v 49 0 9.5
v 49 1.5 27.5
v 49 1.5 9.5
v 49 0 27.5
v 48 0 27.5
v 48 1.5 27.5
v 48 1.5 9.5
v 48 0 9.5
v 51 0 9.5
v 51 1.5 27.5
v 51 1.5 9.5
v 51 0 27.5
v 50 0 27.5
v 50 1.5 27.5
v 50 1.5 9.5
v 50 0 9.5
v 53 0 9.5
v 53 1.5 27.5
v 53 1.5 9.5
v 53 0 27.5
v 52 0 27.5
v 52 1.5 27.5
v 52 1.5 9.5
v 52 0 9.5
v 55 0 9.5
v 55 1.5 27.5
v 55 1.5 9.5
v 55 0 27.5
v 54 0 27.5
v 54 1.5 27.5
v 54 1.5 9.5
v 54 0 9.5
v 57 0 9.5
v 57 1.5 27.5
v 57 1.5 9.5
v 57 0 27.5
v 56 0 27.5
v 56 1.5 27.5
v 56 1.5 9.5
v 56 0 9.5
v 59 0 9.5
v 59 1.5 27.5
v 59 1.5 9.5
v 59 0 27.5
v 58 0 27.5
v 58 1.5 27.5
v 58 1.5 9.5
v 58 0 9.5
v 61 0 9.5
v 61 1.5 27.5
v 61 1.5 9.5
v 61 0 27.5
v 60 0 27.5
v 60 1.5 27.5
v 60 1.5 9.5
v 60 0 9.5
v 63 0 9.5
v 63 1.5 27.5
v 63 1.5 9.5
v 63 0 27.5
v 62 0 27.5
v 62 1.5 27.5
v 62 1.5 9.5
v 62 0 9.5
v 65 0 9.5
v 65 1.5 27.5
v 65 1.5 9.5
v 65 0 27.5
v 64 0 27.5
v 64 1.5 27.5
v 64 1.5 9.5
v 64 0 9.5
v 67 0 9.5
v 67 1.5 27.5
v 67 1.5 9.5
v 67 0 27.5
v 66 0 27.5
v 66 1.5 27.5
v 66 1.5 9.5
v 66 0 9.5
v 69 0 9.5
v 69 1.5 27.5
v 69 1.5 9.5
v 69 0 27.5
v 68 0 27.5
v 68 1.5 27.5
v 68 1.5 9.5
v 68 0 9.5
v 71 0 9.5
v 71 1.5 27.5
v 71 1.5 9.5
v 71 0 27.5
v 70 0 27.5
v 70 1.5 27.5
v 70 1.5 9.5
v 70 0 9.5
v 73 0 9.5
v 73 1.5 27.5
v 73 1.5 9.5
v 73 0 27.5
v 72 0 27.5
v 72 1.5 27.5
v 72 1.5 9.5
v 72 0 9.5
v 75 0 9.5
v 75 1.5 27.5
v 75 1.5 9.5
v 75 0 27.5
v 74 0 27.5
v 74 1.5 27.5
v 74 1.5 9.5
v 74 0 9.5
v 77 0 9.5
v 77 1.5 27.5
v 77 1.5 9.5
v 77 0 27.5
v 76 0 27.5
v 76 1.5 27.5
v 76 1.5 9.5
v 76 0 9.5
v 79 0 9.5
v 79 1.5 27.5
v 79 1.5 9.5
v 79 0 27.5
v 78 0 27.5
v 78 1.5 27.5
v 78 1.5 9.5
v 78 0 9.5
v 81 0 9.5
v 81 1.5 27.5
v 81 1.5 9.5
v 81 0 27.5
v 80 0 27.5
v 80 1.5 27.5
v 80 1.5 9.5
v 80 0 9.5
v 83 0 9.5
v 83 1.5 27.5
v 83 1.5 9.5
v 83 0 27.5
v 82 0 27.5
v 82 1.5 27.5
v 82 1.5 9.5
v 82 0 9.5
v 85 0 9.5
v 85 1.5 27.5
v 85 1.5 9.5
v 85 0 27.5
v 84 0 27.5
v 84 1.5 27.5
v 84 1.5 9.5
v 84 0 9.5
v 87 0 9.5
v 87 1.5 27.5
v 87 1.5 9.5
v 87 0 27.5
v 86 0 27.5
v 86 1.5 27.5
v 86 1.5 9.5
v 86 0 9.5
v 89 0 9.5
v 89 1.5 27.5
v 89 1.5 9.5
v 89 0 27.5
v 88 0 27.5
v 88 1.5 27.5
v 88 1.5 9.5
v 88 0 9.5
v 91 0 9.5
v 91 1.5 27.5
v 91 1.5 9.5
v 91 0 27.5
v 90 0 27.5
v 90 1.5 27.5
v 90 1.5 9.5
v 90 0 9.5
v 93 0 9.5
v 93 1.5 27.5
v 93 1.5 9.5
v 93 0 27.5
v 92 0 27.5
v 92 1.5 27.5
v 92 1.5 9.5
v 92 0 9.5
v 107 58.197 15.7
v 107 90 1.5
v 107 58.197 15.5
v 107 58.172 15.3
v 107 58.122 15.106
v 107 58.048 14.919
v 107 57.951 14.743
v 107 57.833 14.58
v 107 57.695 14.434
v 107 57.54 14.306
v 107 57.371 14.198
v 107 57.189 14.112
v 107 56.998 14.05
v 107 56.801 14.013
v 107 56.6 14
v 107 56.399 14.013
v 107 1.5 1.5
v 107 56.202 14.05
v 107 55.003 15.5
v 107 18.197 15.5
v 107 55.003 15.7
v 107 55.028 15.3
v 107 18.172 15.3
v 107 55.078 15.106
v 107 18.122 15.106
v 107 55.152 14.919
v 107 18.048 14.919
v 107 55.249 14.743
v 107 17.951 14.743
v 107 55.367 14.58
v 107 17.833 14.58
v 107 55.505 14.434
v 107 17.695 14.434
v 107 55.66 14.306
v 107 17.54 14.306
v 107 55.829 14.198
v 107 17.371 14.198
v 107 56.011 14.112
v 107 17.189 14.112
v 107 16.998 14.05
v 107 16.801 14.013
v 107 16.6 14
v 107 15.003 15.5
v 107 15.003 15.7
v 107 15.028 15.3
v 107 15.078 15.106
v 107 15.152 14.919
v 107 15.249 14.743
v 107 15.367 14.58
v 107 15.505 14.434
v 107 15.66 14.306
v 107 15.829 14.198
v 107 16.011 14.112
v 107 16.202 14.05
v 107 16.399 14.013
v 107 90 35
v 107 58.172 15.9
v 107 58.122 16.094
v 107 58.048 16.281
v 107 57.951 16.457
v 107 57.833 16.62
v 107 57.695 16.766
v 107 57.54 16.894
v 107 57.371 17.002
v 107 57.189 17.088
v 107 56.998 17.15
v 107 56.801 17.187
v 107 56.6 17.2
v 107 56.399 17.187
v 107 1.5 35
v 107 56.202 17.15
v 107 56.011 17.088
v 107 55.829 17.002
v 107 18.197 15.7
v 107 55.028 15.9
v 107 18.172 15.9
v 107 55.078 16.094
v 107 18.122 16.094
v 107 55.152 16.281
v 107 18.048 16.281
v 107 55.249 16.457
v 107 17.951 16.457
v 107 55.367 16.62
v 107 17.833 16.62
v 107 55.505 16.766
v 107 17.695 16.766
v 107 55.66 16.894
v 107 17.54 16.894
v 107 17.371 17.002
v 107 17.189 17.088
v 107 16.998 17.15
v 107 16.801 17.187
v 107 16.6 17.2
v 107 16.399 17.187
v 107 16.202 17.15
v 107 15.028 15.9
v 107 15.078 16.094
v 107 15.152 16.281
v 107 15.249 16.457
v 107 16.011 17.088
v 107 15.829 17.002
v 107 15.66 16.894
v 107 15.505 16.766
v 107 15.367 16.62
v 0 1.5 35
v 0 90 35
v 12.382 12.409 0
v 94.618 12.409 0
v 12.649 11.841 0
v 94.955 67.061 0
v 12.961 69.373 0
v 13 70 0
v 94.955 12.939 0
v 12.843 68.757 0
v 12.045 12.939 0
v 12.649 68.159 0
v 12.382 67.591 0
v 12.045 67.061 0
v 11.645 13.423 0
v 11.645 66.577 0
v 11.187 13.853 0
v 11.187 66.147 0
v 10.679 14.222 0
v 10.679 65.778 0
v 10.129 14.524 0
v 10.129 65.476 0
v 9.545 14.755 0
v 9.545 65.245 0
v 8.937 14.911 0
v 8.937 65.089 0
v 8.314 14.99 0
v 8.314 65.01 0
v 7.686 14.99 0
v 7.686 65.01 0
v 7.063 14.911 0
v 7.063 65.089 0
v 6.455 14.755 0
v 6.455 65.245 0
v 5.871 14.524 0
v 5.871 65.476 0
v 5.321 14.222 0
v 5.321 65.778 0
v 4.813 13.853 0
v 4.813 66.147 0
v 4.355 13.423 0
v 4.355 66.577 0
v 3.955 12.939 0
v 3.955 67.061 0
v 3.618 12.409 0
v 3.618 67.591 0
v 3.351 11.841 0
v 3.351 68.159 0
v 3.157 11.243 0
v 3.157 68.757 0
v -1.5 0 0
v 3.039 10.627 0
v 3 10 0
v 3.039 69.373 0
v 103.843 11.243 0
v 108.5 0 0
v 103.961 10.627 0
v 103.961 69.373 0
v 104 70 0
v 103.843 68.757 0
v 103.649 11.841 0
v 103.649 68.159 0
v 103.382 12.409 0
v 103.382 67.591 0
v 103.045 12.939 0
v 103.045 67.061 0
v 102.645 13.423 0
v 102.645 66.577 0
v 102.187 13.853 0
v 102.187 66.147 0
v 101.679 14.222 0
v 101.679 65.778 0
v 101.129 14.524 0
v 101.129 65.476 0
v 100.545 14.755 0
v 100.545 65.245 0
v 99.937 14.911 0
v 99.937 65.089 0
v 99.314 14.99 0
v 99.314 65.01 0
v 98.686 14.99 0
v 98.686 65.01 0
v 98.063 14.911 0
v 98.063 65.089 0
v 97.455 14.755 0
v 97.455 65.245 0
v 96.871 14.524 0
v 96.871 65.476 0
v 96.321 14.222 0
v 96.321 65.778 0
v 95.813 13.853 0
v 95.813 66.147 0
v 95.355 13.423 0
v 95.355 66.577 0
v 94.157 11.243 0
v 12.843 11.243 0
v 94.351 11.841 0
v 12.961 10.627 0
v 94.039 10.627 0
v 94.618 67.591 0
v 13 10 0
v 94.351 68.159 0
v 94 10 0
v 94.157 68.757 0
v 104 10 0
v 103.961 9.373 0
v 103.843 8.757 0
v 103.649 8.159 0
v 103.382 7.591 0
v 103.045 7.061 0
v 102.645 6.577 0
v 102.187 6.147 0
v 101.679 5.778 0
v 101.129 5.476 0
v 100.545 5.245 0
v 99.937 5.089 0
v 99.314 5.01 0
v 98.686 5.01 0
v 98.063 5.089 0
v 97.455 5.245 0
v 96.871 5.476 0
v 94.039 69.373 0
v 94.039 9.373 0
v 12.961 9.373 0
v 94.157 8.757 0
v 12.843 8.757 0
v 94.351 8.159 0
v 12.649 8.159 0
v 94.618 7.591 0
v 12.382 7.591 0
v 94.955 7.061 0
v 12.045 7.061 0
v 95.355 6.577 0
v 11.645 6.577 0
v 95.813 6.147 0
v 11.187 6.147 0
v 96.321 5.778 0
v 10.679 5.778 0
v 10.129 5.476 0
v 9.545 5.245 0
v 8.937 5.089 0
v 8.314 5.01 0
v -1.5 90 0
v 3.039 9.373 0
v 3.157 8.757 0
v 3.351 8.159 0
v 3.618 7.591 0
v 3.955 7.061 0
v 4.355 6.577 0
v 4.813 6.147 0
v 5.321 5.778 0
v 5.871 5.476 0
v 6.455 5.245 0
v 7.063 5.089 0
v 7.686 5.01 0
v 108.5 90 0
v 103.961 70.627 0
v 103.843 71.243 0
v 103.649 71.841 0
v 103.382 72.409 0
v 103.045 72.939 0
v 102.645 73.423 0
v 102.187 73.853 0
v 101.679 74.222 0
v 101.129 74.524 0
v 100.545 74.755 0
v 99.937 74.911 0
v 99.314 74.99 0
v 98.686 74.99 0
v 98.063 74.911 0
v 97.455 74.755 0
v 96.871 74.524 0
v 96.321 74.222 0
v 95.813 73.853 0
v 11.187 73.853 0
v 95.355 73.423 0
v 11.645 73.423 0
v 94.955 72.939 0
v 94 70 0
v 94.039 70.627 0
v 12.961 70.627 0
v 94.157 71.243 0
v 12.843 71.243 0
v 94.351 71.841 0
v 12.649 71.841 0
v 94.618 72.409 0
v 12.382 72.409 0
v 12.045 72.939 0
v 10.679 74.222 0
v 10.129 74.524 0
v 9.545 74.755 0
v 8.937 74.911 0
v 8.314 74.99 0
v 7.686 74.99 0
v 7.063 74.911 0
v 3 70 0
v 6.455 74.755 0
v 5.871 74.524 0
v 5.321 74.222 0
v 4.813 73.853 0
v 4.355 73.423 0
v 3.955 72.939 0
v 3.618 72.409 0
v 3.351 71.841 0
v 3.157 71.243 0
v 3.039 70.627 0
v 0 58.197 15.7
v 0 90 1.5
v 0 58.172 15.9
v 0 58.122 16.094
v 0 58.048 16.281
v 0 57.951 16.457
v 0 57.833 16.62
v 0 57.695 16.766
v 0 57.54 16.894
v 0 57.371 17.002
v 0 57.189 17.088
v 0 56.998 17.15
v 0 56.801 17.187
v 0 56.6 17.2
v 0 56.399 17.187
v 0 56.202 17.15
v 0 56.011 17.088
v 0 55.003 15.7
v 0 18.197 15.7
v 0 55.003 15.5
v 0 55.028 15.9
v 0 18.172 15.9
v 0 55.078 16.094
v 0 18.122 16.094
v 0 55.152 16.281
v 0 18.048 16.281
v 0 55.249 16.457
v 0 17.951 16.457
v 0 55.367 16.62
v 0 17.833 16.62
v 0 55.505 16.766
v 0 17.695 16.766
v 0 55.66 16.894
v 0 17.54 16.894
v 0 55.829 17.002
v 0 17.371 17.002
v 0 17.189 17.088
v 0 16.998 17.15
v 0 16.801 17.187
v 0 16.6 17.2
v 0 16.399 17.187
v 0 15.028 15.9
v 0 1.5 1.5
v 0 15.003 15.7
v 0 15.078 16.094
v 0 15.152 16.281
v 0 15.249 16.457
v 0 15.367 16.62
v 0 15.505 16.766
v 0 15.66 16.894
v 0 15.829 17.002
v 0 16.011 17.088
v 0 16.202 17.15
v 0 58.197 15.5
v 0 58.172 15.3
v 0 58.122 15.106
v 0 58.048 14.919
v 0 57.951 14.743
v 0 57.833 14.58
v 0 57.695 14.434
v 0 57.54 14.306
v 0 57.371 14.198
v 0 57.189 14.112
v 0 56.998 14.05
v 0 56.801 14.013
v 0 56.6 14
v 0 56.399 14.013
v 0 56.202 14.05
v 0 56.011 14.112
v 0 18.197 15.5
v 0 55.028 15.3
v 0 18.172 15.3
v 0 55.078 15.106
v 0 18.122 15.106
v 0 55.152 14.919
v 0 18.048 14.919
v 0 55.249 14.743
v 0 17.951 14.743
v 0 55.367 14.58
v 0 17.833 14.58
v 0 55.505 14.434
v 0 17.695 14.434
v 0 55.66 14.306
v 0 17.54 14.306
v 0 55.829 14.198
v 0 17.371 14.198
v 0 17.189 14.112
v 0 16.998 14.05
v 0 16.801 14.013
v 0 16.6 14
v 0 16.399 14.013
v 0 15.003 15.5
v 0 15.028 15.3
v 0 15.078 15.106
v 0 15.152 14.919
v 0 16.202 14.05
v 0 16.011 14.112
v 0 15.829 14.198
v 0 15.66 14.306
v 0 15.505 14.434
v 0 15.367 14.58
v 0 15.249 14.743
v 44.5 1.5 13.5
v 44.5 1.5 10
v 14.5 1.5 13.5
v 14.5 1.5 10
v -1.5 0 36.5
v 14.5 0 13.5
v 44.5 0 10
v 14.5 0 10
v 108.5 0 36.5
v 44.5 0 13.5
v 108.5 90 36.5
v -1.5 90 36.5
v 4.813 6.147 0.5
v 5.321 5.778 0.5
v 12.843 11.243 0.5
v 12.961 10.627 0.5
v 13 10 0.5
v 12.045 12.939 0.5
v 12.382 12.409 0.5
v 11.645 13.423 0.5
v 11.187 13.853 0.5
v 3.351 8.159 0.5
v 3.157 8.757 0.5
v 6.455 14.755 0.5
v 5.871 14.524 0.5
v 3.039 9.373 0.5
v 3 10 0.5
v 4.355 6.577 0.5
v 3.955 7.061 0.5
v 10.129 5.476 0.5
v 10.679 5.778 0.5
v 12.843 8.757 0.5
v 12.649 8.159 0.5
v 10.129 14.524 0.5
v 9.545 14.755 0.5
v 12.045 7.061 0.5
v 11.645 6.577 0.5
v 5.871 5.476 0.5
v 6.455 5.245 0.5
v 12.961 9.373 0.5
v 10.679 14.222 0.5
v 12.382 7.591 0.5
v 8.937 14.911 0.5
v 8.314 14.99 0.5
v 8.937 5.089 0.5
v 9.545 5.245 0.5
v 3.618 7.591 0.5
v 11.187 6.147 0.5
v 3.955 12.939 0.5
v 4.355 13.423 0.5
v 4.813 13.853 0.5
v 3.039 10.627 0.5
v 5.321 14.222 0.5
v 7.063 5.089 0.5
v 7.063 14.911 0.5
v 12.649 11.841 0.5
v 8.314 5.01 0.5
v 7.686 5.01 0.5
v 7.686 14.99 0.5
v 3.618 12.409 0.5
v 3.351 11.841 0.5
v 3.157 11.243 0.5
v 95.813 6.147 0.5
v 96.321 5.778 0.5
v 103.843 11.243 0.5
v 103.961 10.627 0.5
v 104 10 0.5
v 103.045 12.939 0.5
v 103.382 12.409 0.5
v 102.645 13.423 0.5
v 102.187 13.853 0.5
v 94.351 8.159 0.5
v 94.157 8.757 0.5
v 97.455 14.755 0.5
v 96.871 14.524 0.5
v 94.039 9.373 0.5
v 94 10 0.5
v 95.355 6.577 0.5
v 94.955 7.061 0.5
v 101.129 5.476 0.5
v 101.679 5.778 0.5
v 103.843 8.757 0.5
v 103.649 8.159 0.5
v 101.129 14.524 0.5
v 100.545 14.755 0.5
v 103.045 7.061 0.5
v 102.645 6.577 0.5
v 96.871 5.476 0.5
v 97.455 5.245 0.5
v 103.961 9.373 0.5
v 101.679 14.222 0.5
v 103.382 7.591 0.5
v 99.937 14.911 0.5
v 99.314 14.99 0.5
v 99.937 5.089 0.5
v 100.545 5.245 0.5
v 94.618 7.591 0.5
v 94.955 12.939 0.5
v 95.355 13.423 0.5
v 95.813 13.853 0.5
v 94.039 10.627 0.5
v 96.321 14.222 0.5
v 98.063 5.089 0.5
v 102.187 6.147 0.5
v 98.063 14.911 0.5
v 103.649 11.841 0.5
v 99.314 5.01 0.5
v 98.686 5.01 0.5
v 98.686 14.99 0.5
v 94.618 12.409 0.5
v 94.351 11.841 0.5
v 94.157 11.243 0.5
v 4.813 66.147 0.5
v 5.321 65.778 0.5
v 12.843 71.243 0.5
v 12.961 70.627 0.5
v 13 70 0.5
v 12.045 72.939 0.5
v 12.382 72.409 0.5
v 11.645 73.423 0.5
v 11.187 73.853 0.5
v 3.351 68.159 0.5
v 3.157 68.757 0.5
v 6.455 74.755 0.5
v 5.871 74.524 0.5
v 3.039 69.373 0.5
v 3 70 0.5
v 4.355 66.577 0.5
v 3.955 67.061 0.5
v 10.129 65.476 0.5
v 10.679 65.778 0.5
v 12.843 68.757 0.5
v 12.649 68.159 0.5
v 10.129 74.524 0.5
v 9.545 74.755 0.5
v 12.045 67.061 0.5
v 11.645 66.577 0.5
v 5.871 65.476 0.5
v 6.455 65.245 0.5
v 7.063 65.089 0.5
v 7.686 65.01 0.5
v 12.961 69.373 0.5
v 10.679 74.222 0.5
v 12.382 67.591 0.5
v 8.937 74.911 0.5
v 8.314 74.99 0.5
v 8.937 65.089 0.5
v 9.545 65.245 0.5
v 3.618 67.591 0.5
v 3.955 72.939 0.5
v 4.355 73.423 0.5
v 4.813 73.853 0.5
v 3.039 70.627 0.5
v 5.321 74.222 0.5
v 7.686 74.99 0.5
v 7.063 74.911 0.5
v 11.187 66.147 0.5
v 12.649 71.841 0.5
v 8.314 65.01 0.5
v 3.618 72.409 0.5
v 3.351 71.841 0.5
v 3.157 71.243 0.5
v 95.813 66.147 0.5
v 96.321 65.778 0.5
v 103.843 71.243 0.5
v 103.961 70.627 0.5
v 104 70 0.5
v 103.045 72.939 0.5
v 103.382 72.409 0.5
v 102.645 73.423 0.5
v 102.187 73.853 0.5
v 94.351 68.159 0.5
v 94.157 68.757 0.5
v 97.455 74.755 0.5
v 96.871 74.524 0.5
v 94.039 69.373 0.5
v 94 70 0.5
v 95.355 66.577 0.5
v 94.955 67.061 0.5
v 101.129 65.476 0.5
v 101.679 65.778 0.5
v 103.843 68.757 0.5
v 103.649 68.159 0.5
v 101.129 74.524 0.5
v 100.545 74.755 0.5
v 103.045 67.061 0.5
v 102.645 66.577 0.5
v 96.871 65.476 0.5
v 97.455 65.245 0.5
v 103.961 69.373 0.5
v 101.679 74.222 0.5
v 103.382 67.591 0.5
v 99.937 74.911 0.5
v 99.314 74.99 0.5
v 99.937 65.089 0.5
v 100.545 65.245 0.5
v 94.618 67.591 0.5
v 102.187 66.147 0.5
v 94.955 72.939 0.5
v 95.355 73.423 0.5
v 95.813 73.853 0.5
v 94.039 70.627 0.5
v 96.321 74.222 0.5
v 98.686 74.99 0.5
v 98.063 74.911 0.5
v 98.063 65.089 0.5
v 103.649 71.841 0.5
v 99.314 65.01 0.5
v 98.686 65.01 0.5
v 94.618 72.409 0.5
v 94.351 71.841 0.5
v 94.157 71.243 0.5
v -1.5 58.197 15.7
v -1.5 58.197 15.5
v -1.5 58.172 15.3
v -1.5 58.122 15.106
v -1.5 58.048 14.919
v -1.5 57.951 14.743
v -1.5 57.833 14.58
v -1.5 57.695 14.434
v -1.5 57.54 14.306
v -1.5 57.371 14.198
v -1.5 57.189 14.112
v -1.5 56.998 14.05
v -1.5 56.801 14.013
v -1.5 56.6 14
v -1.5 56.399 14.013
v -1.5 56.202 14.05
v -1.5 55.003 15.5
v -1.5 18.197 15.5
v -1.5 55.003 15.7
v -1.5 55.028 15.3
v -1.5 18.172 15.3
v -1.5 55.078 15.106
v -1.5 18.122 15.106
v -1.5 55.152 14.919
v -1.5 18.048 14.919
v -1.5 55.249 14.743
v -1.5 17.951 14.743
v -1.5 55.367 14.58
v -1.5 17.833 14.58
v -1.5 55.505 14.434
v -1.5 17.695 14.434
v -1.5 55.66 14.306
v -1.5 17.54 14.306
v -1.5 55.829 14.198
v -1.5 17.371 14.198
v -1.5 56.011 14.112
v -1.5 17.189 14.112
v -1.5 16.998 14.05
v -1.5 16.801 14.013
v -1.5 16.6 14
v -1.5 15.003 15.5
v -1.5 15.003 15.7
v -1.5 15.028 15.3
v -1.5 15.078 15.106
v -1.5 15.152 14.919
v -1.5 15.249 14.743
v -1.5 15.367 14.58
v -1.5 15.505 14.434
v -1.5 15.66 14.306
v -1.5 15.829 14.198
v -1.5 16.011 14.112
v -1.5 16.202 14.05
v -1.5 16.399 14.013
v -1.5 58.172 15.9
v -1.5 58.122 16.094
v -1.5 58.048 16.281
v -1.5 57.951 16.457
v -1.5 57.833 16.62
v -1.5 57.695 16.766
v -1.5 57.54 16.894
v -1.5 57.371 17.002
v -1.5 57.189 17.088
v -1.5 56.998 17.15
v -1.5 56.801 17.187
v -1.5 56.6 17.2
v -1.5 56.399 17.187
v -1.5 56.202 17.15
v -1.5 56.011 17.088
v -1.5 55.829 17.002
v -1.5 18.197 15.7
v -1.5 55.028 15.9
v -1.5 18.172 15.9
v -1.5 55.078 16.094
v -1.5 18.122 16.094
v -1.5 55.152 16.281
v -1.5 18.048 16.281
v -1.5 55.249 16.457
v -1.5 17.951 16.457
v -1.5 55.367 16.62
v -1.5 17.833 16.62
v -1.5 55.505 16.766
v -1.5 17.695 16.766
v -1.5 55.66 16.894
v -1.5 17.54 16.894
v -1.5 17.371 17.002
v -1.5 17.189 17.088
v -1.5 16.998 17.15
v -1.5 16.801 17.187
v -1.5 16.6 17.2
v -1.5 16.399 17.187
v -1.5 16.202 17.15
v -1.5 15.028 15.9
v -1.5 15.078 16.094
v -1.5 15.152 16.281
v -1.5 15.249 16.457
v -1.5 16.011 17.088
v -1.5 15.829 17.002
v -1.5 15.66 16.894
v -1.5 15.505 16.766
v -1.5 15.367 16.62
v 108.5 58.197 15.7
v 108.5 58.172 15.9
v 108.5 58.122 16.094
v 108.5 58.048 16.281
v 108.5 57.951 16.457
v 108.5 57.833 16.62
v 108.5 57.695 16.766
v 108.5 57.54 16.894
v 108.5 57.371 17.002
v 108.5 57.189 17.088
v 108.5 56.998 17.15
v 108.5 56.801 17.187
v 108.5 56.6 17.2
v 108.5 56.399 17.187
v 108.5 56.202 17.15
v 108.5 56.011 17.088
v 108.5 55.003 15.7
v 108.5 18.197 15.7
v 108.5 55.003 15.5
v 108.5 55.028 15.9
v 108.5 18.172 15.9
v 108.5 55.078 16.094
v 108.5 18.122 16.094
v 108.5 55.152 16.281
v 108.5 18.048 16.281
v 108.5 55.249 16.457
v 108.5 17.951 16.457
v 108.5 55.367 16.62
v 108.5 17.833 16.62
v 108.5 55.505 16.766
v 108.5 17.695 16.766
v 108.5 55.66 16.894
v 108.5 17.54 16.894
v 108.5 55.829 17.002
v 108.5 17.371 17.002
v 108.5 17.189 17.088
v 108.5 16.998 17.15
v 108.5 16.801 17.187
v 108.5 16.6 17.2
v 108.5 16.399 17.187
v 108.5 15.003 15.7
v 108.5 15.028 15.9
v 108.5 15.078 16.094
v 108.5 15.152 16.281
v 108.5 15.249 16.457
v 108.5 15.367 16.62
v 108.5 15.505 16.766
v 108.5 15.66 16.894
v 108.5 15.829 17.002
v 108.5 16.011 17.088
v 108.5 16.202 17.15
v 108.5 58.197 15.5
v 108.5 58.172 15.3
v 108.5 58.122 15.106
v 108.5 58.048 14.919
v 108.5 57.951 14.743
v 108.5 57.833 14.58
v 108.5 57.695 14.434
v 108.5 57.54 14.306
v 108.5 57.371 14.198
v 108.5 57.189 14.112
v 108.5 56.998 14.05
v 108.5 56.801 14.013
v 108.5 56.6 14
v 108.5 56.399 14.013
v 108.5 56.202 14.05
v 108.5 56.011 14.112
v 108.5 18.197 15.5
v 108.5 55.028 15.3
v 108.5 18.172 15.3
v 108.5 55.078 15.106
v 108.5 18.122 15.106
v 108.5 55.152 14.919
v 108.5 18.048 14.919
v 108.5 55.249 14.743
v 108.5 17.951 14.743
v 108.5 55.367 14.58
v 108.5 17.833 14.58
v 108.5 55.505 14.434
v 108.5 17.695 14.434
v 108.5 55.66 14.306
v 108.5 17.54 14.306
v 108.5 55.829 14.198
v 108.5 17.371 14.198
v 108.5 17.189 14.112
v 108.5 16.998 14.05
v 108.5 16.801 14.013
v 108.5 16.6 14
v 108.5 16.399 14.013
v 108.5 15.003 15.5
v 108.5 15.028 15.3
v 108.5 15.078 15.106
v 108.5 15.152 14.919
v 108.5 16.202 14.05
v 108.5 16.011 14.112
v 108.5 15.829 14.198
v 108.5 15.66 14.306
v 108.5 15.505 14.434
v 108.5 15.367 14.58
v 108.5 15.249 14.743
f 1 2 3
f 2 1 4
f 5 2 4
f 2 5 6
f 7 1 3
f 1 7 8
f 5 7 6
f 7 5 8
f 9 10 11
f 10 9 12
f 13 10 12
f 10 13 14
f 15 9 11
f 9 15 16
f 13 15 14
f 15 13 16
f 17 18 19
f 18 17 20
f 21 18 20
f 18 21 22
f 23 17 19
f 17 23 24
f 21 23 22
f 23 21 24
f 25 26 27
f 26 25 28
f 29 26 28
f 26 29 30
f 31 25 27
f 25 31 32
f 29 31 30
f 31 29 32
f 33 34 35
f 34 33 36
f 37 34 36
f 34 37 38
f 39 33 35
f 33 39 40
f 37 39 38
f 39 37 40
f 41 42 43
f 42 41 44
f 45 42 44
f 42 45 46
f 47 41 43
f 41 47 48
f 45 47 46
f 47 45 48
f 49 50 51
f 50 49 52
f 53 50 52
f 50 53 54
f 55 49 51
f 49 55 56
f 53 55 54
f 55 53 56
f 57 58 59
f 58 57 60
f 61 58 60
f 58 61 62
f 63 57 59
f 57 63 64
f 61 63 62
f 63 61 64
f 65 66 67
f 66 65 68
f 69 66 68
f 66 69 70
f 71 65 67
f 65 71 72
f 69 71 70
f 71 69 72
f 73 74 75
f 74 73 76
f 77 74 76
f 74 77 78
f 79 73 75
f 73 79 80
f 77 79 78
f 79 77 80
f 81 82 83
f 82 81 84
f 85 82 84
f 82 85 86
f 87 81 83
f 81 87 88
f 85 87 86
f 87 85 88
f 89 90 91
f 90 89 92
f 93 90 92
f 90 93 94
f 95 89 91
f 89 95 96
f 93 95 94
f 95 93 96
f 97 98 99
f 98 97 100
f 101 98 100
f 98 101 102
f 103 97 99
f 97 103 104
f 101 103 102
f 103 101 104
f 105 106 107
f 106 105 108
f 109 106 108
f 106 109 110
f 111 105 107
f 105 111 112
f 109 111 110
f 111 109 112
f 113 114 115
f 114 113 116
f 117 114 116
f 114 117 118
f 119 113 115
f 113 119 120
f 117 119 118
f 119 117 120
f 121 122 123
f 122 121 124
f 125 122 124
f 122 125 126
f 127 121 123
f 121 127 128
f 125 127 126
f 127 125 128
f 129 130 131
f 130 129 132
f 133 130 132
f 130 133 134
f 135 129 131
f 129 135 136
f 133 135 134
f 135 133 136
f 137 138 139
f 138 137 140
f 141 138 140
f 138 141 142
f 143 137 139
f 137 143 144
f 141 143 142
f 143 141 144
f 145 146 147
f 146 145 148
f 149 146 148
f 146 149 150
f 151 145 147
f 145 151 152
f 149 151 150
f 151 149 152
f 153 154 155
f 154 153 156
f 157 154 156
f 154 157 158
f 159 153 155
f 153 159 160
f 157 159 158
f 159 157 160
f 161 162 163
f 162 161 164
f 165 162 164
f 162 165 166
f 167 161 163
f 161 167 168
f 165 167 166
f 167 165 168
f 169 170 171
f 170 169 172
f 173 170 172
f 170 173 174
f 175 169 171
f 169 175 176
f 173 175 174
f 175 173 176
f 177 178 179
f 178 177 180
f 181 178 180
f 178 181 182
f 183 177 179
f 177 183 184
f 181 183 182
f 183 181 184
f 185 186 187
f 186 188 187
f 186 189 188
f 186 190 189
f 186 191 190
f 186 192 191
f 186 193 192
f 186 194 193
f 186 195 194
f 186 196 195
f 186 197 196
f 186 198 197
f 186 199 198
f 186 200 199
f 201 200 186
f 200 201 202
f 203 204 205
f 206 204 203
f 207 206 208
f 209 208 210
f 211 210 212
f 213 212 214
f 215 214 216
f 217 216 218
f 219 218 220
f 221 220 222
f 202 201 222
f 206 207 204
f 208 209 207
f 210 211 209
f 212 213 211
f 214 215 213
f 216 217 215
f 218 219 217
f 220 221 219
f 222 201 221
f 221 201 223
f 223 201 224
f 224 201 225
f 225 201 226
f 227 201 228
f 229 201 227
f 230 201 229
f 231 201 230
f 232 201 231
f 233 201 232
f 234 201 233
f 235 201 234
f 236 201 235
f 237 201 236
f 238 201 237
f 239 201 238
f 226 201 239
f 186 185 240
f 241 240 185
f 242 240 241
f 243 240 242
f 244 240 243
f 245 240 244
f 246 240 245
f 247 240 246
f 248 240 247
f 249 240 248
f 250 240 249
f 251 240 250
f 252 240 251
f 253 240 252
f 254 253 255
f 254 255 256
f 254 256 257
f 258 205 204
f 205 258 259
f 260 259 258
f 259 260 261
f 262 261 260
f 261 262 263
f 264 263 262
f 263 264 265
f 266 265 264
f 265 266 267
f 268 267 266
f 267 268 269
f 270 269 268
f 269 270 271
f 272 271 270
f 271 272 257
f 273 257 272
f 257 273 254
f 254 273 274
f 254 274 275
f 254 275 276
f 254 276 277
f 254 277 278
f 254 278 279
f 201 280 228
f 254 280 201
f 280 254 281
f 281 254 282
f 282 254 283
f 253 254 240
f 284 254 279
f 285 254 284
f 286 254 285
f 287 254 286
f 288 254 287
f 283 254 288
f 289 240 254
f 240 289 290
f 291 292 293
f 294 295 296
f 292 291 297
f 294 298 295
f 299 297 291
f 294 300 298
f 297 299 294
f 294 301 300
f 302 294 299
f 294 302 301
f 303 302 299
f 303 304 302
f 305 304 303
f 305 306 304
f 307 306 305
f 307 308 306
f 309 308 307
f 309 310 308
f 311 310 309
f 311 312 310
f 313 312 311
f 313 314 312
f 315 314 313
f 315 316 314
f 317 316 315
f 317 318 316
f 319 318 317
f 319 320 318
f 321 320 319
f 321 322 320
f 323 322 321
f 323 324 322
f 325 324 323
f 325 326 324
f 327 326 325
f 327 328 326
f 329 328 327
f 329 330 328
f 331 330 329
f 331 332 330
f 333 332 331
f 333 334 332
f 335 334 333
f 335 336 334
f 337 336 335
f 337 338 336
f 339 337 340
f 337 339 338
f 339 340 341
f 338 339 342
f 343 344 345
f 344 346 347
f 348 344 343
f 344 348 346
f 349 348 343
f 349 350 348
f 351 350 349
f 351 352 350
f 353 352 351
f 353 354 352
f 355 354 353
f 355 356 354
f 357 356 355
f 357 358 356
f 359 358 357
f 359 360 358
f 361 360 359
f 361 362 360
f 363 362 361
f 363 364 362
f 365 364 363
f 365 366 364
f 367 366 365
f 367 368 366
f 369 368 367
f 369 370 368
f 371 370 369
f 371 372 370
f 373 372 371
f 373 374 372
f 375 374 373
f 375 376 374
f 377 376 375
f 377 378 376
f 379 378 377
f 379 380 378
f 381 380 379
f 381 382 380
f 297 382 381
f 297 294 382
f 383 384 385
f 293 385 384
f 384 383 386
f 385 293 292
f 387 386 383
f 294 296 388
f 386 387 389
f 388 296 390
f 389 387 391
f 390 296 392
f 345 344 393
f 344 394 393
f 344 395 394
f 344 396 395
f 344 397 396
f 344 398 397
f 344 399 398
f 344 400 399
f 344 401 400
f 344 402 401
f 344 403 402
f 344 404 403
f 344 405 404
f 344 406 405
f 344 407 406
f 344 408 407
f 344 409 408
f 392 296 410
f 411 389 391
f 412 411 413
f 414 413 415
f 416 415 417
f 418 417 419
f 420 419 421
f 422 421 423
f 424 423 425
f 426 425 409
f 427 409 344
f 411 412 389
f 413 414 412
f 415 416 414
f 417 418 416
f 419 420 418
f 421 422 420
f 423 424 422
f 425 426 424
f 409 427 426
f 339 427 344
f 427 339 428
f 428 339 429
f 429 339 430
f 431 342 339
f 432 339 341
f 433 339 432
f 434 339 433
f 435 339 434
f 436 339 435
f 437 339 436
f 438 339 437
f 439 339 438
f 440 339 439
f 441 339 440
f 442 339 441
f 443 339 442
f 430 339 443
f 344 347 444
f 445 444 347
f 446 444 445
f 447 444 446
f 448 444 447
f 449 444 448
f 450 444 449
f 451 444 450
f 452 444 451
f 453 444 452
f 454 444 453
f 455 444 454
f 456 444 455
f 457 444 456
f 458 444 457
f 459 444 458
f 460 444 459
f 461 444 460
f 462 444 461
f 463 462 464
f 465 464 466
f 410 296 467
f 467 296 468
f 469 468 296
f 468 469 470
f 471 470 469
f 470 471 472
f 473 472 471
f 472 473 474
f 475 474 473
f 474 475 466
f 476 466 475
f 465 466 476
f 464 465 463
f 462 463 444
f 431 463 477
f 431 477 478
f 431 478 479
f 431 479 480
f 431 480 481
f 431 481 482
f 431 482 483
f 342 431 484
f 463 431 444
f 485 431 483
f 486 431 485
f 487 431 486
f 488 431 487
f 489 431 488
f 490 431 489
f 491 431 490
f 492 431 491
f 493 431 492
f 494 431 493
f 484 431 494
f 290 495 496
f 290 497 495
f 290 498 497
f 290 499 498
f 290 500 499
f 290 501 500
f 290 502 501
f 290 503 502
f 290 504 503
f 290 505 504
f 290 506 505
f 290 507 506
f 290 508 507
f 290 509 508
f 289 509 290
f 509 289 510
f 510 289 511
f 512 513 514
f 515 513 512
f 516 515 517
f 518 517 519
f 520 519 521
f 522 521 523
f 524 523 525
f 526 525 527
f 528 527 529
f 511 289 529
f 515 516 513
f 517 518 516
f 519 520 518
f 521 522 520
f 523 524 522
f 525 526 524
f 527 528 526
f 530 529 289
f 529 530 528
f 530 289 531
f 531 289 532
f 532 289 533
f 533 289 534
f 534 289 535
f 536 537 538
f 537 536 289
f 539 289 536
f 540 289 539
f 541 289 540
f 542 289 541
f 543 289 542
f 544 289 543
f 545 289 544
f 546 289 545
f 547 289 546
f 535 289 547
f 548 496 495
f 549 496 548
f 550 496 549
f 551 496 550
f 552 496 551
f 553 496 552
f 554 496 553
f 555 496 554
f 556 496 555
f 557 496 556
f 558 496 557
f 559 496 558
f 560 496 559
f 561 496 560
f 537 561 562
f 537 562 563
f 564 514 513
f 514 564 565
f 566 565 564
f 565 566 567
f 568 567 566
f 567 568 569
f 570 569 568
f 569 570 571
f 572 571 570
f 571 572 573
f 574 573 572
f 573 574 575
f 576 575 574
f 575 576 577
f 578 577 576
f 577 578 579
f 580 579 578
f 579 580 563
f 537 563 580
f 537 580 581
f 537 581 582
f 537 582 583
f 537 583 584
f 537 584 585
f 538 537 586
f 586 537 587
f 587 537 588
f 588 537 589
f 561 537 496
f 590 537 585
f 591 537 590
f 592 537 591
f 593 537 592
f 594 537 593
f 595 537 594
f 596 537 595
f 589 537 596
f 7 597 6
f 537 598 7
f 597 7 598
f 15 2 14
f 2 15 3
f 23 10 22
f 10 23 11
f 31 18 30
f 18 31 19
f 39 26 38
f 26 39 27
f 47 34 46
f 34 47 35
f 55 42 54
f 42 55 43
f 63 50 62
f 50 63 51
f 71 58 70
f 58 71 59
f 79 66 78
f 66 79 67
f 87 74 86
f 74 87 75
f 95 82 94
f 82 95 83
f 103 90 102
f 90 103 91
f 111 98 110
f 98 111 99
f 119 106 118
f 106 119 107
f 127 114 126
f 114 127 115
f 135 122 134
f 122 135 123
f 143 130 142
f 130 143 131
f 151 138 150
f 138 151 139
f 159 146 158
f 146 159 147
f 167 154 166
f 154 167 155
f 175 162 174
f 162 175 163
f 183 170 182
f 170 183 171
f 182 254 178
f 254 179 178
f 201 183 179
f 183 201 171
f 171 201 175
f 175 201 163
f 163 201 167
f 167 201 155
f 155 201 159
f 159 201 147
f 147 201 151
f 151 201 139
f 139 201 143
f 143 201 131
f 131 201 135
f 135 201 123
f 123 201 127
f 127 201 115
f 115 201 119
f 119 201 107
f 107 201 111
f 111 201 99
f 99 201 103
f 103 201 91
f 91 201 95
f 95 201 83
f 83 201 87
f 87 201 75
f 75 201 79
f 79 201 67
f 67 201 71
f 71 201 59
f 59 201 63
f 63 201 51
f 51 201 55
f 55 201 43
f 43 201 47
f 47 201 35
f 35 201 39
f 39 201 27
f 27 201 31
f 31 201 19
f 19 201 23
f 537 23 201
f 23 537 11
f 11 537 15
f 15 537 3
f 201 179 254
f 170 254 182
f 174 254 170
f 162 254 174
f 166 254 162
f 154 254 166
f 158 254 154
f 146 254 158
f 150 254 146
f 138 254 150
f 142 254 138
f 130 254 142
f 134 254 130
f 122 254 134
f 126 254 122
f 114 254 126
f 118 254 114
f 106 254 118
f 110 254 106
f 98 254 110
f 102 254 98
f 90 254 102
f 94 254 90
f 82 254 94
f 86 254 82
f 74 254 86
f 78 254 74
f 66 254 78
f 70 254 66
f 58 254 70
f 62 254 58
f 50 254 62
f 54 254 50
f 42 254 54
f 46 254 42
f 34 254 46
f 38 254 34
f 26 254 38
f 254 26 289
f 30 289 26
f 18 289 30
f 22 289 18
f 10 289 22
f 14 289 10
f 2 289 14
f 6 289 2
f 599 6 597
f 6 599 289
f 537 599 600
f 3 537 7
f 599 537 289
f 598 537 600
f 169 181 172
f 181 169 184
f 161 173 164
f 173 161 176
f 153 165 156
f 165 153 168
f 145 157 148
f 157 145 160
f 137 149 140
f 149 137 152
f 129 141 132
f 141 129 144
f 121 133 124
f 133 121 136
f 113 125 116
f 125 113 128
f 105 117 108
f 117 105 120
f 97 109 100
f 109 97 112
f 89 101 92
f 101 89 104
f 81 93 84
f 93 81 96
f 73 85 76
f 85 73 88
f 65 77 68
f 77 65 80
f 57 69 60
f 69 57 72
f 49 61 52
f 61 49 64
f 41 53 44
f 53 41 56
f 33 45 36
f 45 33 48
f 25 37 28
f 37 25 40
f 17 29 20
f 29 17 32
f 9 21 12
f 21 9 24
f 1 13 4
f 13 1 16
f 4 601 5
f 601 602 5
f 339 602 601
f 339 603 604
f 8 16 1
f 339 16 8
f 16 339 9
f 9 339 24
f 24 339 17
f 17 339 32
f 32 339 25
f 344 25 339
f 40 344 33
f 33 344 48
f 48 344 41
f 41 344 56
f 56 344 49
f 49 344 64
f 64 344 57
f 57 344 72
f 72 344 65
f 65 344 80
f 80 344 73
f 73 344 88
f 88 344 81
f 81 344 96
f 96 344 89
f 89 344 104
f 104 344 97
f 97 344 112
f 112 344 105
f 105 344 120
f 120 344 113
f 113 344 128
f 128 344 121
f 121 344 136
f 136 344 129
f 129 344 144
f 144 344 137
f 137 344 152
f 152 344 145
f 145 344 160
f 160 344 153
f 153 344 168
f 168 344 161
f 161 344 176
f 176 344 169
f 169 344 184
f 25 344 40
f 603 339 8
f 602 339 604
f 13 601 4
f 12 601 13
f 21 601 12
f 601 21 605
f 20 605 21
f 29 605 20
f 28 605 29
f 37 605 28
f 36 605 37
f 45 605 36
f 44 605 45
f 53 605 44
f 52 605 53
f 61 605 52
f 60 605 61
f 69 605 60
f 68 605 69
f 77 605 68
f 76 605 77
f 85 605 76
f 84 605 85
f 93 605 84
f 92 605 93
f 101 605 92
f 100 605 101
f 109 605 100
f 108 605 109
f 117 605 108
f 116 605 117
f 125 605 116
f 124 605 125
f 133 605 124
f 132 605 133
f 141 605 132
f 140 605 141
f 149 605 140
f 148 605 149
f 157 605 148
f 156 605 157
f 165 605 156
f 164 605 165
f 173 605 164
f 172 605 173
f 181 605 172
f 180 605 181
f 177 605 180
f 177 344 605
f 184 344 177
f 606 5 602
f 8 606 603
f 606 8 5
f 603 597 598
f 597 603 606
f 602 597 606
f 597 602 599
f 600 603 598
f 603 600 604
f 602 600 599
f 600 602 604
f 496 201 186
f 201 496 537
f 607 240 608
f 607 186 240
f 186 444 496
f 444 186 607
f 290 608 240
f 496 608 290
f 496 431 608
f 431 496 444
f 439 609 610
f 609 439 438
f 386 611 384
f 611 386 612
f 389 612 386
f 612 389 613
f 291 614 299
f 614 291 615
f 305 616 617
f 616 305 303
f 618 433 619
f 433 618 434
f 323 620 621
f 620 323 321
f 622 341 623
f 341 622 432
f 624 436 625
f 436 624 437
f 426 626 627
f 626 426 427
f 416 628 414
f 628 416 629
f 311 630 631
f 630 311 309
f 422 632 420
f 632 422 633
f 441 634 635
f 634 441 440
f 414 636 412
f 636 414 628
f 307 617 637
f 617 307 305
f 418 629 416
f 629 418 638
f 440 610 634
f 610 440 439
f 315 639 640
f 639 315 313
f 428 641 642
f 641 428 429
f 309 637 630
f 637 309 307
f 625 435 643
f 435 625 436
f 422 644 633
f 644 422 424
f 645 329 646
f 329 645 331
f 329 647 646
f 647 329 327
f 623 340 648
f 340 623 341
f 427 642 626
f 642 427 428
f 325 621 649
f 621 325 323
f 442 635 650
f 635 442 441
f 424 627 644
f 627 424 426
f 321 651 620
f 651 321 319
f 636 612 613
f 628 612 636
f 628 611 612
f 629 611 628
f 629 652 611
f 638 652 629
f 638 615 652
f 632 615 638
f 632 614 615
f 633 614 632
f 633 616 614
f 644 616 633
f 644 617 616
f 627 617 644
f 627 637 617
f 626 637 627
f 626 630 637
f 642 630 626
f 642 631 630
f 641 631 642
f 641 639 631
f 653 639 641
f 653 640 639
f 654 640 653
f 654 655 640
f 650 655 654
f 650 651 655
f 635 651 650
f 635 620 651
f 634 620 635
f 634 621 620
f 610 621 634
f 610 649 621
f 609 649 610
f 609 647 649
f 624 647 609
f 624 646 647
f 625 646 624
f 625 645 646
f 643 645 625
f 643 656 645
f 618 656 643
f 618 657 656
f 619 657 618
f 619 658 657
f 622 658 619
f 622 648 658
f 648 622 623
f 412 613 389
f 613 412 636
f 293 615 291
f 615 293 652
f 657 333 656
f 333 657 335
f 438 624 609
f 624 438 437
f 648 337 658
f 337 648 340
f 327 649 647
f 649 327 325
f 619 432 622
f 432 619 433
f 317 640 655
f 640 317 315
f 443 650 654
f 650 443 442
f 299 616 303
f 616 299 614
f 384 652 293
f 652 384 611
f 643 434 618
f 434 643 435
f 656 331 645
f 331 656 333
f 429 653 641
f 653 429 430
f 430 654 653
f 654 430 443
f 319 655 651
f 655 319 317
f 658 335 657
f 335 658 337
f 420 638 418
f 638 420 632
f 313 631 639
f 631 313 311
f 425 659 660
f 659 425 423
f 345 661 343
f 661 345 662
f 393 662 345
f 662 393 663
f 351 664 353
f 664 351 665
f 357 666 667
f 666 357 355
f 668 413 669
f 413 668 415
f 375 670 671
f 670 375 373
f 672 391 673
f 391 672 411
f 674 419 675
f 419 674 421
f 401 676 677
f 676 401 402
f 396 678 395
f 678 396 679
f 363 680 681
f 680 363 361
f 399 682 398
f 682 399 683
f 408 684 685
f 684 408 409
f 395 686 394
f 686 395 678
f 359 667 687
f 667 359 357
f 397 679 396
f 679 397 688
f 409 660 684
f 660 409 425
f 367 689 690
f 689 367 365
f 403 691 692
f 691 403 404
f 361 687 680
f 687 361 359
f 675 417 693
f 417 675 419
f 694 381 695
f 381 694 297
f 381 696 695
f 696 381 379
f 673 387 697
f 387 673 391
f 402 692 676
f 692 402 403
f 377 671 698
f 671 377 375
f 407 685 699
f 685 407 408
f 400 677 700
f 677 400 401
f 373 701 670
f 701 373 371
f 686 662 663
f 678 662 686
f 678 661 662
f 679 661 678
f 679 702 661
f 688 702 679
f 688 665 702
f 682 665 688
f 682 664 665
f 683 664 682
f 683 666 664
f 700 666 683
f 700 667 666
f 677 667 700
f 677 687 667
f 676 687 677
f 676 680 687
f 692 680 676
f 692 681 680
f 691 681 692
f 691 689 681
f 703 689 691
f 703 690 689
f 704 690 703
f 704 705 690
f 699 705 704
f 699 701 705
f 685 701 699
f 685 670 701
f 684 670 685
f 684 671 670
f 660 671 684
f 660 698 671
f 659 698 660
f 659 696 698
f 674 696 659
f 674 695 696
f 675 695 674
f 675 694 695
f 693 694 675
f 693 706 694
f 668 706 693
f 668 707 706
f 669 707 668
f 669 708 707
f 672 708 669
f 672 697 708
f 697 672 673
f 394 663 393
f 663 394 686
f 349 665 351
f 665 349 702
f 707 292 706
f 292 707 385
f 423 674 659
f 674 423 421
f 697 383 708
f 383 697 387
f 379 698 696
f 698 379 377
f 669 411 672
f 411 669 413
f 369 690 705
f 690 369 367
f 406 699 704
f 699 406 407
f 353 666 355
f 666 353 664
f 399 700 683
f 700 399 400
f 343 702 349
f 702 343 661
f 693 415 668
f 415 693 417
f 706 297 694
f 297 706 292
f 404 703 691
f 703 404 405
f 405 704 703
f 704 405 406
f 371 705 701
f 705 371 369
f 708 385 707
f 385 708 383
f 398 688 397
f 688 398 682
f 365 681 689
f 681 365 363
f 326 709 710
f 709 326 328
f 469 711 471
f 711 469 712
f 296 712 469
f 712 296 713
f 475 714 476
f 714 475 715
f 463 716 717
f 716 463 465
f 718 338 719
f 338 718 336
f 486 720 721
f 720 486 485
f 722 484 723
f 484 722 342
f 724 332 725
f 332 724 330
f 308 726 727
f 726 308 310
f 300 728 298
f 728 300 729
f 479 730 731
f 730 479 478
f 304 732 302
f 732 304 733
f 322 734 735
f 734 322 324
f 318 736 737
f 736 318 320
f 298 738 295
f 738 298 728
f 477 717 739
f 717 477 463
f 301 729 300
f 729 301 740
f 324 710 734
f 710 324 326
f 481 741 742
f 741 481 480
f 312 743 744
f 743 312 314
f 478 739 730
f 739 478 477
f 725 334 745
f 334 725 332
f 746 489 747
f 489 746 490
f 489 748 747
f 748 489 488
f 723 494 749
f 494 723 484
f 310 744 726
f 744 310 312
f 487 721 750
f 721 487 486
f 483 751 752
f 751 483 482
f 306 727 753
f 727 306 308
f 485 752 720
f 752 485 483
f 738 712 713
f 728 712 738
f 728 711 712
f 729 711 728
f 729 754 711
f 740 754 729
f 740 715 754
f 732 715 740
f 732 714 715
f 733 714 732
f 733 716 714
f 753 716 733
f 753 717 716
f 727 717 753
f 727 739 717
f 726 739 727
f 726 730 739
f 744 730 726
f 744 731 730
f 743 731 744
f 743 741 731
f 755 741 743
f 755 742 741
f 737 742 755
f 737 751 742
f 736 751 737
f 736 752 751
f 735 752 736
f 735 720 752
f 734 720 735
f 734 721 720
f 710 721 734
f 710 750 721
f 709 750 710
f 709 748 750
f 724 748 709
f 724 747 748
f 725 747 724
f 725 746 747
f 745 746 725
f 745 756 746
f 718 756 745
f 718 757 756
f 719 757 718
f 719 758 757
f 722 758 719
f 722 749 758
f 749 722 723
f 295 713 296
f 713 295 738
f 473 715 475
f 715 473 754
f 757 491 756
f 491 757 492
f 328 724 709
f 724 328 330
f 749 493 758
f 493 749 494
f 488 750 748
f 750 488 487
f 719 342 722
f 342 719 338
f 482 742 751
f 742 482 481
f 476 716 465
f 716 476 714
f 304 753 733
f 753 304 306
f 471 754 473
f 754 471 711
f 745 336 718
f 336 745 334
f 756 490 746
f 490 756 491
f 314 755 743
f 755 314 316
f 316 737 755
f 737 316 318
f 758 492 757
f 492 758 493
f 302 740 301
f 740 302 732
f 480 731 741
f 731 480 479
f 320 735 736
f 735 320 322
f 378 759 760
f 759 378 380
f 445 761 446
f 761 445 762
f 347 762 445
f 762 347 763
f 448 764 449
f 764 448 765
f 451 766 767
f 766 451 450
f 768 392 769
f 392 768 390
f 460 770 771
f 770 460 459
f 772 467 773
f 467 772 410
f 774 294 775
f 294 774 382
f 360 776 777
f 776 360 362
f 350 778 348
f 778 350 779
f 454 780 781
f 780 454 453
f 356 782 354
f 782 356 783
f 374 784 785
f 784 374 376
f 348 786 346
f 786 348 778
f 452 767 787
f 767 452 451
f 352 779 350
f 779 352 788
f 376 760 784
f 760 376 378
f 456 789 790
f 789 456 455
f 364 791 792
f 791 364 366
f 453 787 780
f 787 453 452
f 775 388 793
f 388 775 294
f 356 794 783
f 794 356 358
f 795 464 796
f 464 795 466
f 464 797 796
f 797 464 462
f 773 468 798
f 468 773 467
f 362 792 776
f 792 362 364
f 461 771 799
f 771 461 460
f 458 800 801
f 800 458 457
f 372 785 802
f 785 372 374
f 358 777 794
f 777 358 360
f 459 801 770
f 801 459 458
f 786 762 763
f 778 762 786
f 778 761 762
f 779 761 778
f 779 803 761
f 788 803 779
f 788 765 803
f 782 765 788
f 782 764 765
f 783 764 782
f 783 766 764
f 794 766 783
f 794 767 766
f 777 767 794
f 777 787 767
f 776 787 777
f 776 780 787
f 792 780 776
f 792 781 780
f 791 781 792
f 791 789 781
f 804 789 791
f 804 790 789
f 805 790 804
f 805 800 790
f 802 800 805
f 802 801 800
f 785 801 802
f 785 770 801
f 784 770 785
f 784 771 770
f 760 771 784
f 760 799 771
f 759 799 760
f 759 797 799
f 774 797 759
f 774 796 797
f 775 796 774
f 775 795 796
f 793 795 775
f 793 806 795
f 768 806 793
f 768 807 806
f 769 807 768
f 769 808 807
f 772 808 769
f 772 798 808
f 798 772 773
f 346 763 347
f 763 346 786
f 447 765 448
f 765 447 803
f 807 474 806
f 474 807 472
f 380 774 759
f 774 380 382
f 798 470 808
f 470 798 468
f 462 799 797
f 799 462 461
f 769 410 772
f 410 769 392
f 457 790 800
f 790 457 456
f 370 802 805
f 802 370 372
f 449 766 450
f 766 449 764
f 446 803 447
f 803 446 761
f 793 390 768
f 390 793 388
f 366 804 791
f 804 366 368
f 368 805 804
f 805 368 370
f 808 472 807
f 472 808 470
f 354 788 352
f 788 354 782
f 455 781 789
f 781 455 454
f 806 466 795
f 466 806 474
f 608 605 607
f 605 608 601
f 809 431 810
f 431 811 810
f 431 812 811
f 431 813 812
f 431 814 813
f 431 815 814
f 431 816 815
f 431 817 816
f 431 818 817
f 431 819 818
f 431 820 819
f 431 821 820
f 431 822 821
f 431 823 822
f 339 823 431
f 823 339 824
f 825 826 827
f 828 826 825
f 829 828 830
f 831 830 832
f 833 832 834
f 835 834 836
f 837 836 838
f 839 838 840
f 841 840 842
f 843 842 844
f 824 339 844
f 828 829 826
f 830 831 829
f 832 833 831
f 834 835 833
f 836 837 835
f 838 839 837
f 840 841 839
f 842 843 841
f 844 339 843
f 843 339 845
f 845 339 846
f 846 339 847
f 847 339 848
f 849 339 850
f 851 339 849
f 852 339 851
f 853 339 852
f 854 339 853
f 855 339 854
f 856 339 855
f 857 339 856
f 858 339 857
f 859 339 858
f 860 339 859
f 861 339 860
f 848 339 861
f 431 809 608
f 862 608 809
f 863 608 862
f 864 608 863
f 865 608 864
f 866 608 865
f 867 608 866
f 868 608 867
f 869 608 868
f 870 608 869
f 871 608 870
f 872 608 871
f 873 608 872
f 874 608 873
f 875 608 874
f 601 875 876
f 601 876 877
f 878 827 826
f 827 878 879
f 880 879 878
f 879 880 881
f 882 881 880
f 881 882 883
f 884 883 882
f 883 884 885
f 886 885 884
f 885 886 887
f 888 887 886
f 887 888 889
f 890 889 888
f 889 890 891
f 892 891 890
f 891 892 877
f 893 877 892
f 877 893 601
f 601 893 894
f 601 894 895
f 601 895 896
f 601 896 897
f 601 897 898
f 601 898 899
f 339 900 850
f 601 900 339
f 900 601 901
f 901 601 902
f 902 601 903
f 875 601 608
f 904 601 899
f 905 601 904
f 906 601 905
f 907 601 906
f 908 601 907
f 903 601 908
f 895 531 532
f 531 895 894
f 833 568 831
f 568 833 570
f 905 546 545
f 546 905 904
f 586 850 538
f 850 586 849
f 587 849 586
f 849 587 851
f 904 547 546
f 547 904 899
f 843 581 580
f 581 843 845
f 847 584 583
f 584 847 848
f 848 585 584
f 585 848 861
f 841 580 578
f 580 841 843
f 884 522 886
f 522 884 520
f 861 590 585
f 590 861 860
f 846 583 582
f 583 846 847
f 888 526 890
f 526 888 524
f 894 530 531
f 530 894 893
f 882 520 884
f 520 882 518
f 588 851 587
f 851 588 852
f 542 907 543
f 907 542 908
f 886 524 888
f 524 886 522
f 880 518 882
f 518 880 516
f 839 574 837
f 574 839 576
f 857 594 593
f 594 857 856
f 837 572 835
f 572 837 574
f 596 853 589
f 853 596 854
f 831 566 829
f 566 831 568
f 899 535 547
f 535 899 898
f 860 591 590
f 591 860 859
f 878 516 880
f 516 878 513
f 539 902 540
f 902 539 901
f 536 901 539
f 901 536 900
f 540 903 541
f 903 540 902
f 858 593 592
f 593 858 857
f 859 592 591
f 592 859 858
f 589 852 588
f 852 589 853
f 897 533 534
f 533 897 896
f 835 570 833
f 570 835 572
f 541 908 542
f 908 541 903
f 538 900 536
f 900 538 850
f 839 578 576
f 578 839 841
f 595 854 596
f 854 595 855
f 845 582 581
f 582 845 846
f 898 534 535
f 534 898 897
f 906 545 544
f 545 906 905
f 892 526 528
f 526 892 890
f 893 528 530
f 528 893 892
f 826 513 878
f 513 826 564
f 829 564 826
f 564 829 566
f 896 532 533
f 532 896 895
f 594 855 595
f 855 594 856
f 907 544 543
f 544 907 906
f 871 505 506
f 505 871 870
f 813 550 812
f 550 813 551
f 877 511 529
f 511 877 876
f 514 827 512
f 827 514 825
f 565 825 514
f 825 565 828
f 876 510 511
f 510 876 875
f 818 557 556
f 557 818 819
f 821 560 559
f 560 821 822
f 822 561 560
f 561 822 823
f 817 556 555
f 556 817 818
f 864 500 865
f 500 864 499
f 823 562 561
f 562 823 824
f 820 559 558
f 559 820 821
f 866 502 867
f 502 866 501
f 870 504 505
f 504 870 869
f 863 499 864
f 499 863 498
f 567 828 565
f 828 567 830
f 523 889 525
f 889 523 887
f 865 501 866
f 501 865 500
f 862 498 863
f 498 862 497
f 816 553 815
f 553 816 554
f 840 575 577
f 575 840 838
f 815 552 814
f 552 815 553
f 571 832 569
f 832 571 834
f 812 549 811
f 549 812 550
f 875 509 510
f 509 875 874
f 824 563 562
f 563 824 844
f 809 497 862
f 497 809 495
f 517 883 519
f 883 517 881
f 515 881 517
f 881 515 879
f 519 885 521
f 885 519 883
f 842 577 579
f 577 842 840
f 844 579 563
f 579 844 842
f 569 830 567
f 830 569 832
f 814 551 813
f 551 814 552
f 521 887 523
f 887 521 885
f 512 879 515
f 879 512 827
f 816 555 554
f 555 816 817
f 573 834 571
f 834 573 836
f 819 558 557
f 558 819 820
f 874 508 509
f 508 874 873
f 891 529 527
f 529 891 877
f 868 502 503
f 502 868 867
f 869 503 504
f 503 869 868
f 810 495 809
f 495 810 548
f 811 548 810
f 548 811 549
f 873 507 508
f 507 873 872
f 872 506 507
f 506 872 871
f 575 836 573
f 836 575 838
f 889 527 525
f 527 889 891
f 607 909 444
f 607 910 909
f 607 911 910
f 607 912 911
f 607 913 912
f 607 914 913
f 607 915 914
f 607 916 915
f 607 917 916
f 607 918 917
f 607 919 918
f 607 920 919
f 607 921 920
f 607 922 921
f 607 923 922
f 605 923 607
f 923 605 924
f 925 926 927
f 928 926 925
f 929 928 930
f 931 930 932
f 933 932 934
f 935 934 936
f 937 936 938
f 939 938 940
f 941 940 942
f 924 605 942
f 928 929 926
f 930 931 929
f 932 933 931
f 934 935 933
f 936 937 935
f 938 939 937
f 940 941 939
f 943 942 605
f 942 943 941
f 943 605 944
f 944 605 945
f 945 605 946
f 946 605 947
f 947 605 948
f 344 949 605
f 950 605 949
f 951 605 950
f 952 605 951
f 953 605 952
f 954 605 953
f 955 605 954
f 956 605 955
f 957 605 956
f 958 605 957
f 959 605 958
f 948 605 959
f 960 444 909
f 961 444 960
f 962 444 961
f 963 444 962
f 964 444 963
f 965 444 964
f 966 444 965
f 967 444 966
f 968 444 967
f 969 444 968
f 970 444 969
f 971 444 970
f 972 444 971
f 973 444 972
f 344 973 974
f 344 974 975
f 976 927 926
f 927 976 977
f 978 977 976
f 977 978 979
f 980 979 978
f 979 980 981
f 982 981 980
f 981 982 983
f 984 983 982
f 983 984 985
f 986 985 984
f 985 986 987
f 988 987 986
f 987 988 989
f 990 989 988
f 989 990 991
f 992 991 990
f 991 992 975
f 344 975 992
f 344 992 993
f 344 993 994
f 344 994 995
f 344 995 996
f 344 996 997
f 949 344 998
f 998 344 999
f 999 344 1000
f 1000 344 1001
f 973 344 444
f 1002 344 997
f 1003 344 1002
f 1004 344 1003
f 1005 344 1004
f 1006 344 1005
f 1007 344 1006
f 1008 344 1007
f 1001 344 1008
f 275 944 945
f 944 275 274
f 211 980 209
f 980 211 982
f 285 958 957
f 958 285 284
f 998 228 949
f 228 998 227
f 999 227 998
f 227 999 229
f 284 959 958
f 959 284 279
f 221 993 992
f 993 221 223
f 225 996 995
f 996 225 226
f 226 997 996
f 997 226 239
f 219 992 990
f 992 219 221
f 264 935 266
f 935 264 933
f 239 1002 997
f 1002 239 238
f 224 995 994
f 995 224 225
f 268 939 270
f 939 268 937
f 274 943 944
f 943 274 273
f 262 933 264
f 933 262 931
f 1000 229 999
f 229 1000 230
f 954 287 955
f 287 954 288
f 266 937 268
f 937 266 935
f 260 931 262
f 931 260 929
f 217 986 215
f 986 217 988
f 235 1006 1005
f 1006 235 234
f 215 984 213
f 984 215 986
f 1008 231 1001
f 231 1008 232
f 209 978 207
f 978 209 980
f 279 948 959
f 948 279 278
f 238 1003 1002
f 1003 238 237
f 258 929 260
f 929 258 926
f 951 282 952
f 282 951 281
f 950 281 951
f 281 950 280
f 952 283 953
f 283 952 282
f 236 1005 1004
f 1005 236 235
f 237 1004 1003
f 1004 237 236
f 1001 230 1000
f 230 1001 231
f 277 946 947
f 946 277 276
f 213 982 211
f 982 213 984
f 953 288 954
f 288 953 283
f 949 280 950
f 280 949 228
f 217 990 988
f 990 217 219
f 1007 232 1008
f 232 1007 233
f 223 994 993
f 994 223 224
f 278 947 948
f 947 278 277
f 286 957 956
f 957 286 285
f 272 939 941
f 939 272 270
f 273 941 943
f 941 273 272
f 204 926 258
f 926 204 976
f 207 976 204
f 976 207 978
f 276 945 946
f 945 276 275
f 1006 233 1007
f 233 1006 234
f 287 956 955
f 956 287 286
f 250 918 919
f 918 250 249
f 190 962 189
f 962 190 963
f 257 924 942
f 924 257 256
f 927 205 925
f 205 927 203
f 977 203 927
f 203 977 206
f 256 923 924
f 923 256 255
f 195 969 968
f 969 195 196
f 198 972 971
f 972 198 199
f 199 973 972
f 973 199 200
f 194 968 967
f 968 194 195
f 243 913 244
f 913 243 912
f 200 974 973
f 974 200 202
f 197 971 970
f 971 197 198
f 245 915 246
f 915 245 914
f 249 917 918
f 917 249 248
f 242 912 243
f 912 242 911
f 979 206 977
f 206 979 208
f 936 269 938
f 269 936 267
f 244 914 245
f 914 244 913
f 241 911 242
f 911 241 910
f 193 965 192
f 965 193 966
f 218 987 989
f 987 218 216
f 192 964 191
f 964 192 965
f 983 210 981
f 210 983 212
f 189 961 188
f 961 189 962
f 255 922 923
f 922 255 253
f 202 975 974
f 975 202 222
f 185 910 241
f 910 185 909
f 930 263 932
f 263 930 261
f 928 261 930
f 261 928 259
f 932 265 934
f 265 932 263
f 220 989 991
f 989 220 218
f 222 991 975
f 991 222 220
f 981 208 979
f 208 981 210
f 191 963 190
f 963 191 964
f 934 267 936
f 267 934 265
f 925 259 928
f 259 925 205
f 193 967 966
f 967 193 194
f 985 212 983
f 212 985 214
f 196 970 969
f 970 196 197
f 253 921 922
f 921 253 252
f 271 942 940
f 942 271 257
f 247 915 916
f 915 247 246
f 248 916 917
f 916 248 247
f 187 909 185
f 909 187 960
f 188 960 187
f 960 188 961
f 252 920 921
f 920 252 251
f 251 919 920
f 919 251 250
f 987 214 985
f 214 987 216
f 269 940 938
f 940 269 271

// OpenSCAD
$fa = 1;
$fs = 0.5;
$fn = 50;

////////////////////////////////
// All measurements are in mm //
////////////////////////////////

tw = 1.5; // thickness of any walls
total_width = 107;


difference() {
  // Faceplate
 cube([total_width, tw, 35]);

  // FreHD
  translate([14 + tw, -1, 8 + tw]) {
    // sd card hole
    translate([-1,0,0.5]) cube([30,10,3.5]);
  }
  for (xpos=[36:2:80]) { // grill to see leds
    translate([- 5 + (total_width/2) - 36.5 + xpos, -1, 9.5])
      cube([1,2*tw,18]);
  }
}

// Top
translate([0, 0, 35]) cube([total_width, 90, tw]);

// Bottom
difference() {
  cube([total_width, 90, tw]);
  translate([8,10,-1]) cylinder(h=tw,r=5);
  translate([99,10,-1]) cylinder(h=tw,r=5);
  translate([8,70,-1]) cylinder(h=tw,r=5);
  translate([99,70,-1]) cylinder(h=tw,r=5);
}

// Side supports
module side() {
  difference() {
    translate([0,0,0]) cube([tw,90,36.5]);
    // FreHD4Eight screw holes
    translate ([-1,tw+0.1+15,2*tw+12.6]) rotate([0,90,0]) cylinder(h=tw*2,r=1.6);
    translate ([-1,tw+0.1+55,2*tw+12.6]) rotate([0,90,0]) cylinder(h=tw*2,r=1.6);
  }
}
translate([-tw, 0, 0]) side();
translate([total_width, 0, 0]) side();
